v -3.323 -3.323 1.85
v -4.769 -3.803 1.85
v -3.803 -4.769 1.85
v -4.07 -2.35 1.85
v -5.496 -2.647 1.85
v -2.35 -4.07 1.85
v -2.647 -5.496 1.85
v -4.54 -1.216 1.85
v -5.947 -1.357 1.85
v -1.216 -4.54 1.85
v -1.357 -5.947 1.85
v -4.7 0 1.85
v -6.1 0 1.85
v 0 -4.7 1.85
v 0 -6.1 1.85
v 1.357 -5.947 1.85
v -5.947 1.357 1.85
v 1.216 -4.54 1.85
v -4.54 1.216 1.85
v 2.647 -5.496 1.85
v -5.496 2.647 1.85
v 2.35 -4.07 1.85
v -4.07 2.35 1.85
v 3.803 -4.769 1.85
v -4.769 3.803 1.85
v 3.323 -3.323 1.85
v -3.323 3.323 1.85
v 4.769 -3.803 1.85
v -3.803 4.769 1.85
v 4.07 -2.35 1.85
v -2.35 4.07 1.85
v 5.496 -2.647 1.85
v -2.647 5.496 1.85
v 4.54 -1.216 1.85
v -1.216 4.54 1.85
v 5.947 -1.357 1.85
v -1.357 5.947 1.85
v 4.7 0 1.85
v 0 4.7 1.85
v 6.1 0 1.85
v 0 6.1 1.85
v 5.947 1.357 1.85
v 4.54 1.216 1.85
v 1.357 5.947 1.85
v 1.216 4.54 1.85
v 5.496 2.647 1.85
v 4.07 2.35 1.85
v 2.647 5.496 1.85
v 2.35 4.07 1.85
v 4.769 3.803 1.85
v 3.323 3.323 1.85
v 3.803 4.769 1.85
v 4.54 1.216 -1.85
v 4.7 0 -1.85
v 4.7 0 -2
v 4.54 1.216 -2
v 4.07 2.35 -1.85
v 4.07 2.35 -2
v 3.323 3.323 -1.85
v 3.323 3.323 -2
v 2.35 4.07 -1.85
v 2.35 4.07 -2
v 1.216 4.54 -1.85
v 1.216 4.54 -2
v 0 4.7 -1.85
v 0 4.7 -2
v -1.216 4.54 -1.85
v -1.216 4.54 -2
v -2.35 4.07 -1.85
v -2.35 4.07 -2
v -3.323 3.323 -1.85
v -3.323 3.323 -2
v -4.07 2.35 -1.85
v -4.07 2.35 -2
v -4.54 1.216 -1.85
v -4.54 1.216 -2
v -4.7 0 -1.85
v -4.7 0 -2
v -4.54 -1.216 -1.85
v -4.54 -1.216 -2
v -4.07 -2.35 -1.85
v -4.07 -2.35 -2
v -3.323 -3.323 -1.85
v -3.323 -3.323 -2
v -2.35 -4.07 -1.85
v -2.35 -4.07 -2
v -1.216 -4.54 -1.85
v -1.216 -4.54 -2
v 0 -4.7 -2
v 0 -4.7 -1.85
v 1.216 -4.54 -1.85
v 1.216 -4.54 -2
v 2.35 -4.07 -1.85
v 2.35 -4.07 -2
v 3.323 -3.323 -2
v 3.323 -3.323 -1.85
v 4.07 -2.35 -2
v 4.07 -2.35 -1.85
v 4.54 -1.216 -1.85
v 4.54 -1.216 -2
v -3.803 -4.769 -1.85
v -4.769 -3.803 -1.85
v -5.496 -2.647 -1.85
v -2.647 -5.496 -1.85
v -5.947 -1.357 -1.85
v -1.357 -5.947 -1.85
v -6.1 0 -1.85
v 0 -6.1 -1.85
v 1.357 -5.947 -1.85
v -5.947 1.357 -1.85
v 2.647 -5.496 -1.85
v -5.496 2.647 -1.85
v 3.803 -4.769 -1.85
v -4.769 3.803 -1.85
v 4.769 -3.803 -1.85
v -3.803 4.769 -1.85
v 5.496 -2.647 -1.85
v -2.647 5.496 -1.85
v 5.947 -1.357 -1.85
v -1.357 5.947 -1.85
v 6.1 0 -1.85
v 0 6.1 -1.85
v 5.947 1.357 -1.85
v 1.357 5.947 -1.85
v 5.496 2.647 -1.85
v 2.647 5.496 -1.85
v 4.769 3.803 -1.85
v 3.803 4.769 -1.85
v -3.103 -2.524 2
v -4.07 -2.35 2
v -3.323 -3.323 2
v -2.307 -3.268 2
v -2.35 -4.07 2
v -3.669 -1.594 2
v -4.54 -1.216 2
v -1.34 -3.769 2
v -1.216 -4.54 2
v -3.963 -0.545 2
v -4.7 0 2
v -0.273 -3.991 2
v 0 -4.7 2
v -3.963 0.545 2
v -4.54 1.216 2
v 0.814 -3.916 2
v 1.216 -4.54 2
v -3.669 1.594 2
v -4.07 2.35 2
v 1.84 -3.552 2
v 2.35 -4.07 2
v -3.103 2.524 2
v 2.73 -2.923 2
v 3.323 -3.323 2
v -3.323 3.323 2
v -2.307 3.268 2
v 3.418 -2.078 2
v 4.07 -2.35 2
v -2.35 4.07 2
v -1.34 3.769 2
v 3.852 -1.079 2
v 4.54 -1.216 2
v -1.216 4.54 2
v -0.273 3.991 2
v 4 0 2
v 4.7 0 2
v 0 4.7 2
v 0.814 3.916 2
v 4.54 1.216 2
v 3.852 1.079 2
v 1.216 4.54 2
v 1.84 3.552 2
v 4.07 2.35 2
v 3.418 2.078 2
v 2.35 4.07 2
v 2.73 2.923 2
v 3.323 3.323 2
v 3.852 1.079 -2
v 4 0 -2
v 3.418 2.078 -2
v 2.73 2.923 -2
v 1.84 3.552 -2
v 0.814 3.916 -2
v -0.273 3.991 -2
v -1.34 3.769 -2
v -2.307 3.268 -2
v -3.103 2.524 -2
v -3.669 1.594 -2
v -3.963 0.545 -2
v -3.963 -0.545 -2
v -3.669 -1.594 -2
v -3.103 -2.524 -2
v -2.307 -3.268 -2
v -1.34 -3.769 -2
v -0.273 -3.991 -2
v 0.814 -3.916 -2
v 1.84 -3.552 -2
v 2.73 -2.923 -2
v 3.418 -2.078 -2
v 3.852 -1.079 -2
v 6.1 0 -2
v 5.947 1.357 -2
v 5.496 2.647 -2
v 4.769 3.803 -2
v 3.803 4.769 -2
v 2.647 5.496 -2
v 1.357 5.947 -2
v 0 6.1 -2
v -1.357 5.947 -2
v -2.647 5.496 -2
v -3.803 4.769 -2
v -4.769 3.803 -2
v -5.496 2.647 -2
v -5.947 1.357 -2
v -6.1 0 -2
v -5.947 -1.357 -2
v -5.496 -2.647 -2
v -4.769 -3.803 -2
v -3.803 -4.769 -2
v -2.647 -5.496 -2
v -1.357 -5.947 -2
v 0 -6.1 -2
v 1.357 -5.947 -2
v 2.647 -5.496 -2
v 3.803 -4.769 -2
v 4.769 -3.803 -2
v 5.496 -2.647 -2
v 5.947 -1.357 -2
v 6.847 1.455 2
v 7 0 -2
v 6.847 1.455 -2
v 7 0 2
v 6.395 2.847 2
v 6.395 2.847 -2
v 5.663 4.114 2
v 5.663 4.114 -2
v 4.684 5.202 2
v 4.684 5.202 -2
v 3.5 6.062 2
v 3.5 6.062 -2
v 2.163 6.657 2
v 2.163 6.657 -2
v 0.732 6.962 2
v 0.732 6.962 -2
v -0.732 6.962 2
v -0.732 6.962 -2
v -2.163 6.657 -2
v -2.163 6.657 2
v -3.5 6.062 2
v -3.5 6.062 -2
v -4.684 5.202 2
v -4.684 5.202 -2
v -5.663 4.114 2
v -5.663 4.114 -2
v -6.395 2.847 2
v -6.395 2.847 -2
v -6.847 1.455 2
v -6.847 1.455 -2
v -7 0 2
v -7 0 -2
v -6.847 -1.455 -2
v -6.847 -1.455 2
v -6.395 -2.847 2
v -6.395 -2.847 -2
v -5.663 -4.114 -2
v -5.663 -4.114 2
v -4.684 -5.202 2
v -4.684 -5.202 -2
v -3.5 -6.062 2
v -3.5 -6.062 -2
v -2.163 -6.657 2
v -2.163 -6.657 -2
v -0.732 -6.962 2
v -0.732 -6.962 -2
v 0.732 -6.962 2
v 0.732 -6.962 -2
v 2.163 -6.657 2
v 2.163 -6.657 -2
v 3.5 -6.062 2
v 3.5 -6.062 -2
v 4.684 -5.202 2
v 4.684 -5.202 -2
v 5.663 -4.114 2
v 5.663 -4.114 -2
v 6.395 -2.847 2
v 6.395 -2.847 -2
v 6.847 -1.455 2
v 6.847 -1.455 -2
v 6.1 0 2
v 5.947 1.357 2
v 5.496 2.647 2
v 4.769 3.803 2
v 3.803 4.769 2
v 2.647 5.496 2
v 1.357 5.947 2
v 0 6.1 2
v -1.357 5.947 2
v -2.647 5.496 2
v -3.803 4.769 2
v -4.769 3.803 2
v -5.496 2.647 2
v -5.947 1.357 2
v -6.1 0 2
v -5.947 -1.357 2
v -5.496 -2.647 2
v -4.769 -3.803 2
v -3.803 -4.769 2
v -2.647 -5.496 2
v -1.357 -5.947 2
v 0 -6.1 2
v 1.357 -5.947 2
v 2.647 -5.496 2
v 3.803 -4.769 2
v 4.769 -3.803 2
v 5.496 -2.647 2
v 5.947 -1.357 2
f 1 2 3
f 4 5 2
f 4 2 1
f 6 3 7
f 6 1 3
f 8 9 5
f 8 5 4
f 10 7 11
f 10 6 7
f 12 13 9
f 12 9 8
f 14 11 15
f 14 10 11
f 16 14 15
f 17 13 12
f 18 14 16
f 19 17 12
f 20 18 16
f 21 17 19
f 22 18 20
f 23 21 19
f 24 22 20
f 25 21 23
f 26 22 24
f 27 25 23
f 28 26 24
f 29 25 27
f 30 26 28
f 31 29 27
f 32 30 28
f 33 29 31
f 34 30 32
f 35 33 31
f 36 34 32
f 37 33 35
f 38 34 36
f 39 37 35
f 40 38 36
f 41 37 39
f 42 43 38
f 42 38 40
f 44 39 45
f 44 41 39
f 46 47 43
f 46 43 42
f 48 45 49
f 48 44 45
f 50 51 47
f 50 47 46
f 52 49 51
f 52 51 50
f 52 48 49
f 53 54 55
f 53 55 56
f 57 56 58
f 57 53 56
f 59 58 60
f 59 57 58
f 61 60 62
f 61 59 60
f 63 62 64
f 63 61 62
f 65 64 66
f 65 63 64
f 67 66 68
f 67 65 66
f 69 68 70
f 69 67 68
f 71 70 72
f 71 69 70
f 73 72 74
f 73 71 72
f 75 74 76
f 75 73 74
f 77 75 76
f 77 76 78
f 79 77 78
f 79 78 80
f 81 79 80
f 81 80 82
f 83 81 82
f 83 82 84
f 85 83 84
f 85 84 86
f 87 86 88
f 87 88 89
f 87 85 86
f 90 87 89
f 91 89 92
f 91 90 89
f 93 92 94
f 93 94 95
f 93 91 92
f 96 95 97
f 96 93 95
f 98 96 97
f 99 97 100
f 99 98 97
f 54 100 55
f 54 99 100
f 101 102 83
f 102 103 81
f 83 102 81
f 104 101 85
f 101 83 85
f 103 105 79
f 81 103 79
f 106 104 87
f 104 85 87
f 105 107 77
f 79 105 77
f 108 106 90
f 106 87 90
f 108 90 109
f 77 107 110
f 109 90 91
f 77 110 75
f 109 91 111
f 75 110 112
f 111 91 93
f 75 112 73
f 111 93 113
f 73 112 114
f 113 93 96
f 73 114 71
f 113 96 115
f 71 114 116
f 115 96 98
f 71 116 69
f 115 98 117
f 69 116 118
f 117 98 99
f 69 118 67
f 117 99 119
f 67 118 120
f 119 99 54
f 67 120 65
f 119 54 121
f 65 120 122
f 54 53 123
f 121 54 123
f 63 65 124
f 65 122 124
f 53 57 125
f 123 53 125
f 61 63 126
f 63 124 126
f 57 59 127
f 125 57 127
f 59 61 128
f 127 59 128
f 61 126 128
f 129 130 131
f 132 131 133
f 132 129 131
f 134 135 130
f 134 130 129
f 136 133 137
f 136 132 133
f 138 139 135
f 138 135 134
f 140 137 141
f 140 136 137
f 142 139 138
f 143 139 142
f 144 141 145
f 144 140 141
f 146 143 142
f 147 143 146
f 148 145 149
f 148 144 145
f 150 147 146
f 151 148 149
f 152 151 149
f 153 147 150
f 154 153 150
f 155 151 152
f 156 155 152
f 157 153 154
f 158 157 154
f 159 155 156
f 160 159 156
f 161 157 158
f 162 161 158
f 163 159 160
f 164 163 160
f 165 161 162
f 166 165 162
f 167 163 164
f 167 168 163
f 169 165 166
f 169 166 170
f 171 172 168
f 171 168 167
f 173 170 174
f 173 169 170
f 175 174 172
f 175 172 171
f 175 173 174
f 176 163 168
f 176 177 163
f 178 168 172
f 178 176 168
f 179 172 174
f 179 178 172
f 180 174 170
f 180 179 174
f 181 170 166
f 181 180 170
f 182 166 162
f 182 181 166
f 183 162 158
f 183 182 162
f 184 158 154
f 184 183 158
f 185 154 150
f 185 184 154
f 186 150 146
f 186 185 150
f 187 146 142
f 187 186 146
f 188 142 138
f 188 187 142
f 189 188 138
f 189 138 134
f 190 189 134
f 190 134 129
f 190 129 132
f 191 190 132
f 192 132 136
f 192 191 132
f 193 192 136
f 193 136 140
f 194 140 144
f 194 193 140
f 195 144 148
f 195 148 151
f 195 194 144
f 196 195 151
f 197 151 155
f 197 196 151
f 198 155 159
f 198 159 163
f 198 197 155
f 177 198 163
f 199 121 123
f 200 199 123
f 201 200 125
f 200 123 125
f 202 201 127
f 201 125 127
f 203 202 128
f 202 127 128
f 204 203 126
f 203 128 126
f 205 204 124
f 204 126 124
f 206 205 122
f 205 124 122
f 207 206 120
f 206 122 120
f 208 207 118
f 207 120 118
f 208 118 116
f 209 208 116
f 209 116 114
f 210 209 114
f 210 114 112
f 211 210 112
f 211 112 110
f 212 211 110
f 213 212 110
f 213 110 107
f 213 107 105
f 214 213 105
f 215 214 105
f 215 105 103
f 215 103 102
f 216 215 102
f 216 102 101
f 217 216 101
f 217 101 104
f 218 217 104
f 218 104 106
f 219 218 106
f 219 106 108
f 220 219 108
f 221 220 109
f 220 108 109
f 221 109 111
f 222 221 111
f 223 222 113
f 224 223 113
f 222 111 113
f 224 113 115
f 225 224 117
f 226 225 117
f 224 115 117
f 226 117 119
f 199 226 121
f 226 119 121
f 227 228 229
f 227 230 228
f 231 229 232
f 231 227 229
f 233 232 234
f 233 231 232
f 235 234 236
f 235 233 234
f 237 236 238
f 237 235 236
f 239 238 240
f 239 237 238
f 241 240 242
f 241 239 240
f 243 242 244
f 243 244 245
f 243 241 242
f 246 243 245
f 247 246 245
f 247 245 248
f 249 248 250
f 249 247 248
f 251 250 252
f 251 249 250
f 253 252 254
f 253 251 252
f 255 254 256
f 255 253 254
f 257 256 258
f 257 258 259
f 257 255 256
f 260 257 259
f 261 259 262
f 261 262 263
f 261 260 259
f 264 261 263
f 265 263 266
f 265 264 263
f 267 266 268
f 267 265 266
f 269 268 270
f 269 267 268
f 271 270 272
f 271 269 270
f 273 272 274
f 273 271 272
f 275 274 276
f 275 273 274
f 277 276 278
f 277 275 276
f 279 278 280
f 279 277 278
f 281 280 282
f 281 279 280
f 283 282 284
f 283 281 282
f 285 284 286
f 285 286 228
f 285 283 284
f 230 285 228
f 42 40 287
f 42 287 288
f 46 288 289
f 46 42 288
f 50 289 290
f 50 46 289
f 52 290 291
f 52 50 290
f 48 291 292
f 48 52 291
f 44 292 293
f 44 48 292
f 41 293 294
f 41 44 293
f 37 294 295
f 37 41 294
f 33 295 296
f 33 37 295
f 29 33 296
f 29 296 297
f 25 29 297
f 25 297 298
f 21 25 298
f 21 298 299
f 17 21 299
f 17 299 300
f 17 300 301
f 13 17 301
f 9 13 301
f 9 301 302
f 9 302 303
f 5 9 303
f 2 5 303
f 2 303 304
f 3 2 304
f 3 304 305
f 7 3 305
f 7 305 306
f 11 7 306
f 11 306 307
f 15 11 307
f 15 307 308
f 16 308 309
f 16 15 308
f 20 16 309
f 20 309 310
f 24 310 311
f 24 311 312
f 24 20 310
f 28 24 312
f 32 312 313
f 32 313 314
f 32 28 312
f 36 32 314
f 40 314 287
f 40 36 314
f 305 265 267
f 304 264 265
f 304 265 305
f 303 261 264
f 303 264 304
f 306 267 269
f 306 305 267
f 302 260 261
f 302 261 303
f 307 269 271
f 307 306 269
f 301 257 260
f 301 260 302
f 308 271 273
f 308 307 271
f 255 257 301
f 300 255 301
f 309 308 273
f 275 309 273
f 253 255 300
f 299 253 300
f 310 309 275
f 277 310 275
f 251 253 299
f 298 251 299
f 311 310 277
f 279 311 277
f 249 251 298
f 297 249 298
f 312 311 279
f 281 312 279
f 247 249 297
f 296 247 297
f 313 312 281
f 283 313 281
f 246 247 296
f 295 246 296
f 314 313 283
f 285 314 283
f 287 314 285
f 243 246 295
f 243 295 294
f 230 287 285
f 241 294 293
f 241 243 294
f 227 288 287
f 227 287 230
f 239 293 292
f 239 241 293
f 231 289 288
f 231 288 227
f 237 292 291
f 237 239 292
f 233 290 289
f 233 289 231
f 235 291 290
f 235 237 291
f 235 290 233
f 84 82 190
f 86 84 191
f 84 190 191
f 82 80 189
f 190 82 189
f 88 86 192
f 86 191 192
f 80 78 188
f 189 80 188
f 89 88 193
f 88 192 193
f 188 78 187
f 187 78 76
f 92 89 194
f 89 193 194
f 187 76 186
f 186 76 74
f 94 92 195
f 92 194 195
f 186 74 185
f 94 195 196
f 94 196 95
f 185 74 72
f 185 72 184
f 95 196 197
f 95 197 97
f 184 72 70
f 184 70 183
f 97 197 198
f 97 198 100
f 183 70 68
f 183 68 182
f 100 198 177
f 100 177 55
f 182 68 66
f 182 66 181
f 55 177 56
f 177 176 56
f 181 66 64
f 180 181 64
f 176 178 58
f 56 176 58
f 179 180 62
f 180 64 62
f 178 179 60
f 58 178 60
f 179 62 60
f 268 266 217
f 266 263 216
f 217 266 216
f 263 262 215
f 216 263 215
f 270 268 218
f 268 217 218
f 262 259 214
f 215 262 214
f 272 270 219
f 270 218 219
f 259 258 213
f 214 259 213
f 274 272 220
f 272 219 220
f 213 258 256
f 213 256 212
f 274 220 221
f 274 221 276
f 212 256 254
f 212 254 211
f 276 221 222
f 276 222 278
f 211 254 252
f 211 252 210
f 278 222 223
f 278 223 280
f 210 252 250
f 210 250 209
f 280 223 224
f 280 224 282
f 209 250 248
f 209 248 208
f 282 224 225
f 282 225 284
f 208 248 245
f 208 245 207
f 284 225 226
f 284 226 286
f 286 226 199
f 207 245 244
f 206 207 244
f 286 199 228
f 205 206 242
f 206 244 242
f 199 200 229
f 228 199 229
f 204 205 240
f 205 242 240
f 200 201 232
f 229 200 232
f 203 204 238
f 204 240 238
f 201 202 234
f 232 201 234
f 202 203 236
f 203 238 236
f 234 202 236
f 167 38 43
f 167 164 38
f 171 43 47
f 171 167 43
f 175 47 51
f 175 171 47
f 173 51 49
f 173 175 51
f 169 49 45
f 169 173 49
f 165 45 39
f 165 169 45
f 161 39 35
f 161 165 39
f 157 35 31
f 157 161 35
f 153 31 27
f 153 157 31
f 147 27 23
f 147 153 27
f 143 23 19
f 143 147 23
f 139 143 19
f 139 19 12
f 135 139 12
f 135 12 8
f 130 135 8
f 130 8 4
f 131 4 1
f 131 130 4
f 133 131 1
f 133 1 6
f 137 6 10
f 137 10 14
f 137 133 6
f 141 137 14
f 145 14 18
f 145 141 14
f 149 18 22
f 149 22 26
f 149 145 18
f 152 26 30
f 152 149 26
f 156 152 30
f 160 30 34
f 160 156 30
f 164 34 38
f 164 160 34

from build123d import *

# Parameters (mm, degrees)
F0_R     = 6.1
F0_R_2   = 4.7
F1_DEPTH = 1.85
F0_R_3   = 7
F0_R_4   = 4
F2_DEPTH = 2


with BuildPart() as f1:
    # F0 (on Top) → F1 (new body, symmetric)
    with BuildSketch(Plane.XY):
        Circle(F0_R)
        Circle(F0_R_2, mode=Mode.SUBTRACT)
    extrude(amount=F1_DEPTH, both=True)

    # F0 (on Top) → F2 (join, symmetric)
    with BuildSketch(Plane.XY):
        Circle(F0_R_3)
        Circle(F0_R, mode=Mode.SUBTRACT)
        Circle(F0_R_2)
        Circle(F0_R_4, mode=Mode.SUBTRACT)
    extrude(amount=F2_DEPTH, both=True)


solid = f1.part
